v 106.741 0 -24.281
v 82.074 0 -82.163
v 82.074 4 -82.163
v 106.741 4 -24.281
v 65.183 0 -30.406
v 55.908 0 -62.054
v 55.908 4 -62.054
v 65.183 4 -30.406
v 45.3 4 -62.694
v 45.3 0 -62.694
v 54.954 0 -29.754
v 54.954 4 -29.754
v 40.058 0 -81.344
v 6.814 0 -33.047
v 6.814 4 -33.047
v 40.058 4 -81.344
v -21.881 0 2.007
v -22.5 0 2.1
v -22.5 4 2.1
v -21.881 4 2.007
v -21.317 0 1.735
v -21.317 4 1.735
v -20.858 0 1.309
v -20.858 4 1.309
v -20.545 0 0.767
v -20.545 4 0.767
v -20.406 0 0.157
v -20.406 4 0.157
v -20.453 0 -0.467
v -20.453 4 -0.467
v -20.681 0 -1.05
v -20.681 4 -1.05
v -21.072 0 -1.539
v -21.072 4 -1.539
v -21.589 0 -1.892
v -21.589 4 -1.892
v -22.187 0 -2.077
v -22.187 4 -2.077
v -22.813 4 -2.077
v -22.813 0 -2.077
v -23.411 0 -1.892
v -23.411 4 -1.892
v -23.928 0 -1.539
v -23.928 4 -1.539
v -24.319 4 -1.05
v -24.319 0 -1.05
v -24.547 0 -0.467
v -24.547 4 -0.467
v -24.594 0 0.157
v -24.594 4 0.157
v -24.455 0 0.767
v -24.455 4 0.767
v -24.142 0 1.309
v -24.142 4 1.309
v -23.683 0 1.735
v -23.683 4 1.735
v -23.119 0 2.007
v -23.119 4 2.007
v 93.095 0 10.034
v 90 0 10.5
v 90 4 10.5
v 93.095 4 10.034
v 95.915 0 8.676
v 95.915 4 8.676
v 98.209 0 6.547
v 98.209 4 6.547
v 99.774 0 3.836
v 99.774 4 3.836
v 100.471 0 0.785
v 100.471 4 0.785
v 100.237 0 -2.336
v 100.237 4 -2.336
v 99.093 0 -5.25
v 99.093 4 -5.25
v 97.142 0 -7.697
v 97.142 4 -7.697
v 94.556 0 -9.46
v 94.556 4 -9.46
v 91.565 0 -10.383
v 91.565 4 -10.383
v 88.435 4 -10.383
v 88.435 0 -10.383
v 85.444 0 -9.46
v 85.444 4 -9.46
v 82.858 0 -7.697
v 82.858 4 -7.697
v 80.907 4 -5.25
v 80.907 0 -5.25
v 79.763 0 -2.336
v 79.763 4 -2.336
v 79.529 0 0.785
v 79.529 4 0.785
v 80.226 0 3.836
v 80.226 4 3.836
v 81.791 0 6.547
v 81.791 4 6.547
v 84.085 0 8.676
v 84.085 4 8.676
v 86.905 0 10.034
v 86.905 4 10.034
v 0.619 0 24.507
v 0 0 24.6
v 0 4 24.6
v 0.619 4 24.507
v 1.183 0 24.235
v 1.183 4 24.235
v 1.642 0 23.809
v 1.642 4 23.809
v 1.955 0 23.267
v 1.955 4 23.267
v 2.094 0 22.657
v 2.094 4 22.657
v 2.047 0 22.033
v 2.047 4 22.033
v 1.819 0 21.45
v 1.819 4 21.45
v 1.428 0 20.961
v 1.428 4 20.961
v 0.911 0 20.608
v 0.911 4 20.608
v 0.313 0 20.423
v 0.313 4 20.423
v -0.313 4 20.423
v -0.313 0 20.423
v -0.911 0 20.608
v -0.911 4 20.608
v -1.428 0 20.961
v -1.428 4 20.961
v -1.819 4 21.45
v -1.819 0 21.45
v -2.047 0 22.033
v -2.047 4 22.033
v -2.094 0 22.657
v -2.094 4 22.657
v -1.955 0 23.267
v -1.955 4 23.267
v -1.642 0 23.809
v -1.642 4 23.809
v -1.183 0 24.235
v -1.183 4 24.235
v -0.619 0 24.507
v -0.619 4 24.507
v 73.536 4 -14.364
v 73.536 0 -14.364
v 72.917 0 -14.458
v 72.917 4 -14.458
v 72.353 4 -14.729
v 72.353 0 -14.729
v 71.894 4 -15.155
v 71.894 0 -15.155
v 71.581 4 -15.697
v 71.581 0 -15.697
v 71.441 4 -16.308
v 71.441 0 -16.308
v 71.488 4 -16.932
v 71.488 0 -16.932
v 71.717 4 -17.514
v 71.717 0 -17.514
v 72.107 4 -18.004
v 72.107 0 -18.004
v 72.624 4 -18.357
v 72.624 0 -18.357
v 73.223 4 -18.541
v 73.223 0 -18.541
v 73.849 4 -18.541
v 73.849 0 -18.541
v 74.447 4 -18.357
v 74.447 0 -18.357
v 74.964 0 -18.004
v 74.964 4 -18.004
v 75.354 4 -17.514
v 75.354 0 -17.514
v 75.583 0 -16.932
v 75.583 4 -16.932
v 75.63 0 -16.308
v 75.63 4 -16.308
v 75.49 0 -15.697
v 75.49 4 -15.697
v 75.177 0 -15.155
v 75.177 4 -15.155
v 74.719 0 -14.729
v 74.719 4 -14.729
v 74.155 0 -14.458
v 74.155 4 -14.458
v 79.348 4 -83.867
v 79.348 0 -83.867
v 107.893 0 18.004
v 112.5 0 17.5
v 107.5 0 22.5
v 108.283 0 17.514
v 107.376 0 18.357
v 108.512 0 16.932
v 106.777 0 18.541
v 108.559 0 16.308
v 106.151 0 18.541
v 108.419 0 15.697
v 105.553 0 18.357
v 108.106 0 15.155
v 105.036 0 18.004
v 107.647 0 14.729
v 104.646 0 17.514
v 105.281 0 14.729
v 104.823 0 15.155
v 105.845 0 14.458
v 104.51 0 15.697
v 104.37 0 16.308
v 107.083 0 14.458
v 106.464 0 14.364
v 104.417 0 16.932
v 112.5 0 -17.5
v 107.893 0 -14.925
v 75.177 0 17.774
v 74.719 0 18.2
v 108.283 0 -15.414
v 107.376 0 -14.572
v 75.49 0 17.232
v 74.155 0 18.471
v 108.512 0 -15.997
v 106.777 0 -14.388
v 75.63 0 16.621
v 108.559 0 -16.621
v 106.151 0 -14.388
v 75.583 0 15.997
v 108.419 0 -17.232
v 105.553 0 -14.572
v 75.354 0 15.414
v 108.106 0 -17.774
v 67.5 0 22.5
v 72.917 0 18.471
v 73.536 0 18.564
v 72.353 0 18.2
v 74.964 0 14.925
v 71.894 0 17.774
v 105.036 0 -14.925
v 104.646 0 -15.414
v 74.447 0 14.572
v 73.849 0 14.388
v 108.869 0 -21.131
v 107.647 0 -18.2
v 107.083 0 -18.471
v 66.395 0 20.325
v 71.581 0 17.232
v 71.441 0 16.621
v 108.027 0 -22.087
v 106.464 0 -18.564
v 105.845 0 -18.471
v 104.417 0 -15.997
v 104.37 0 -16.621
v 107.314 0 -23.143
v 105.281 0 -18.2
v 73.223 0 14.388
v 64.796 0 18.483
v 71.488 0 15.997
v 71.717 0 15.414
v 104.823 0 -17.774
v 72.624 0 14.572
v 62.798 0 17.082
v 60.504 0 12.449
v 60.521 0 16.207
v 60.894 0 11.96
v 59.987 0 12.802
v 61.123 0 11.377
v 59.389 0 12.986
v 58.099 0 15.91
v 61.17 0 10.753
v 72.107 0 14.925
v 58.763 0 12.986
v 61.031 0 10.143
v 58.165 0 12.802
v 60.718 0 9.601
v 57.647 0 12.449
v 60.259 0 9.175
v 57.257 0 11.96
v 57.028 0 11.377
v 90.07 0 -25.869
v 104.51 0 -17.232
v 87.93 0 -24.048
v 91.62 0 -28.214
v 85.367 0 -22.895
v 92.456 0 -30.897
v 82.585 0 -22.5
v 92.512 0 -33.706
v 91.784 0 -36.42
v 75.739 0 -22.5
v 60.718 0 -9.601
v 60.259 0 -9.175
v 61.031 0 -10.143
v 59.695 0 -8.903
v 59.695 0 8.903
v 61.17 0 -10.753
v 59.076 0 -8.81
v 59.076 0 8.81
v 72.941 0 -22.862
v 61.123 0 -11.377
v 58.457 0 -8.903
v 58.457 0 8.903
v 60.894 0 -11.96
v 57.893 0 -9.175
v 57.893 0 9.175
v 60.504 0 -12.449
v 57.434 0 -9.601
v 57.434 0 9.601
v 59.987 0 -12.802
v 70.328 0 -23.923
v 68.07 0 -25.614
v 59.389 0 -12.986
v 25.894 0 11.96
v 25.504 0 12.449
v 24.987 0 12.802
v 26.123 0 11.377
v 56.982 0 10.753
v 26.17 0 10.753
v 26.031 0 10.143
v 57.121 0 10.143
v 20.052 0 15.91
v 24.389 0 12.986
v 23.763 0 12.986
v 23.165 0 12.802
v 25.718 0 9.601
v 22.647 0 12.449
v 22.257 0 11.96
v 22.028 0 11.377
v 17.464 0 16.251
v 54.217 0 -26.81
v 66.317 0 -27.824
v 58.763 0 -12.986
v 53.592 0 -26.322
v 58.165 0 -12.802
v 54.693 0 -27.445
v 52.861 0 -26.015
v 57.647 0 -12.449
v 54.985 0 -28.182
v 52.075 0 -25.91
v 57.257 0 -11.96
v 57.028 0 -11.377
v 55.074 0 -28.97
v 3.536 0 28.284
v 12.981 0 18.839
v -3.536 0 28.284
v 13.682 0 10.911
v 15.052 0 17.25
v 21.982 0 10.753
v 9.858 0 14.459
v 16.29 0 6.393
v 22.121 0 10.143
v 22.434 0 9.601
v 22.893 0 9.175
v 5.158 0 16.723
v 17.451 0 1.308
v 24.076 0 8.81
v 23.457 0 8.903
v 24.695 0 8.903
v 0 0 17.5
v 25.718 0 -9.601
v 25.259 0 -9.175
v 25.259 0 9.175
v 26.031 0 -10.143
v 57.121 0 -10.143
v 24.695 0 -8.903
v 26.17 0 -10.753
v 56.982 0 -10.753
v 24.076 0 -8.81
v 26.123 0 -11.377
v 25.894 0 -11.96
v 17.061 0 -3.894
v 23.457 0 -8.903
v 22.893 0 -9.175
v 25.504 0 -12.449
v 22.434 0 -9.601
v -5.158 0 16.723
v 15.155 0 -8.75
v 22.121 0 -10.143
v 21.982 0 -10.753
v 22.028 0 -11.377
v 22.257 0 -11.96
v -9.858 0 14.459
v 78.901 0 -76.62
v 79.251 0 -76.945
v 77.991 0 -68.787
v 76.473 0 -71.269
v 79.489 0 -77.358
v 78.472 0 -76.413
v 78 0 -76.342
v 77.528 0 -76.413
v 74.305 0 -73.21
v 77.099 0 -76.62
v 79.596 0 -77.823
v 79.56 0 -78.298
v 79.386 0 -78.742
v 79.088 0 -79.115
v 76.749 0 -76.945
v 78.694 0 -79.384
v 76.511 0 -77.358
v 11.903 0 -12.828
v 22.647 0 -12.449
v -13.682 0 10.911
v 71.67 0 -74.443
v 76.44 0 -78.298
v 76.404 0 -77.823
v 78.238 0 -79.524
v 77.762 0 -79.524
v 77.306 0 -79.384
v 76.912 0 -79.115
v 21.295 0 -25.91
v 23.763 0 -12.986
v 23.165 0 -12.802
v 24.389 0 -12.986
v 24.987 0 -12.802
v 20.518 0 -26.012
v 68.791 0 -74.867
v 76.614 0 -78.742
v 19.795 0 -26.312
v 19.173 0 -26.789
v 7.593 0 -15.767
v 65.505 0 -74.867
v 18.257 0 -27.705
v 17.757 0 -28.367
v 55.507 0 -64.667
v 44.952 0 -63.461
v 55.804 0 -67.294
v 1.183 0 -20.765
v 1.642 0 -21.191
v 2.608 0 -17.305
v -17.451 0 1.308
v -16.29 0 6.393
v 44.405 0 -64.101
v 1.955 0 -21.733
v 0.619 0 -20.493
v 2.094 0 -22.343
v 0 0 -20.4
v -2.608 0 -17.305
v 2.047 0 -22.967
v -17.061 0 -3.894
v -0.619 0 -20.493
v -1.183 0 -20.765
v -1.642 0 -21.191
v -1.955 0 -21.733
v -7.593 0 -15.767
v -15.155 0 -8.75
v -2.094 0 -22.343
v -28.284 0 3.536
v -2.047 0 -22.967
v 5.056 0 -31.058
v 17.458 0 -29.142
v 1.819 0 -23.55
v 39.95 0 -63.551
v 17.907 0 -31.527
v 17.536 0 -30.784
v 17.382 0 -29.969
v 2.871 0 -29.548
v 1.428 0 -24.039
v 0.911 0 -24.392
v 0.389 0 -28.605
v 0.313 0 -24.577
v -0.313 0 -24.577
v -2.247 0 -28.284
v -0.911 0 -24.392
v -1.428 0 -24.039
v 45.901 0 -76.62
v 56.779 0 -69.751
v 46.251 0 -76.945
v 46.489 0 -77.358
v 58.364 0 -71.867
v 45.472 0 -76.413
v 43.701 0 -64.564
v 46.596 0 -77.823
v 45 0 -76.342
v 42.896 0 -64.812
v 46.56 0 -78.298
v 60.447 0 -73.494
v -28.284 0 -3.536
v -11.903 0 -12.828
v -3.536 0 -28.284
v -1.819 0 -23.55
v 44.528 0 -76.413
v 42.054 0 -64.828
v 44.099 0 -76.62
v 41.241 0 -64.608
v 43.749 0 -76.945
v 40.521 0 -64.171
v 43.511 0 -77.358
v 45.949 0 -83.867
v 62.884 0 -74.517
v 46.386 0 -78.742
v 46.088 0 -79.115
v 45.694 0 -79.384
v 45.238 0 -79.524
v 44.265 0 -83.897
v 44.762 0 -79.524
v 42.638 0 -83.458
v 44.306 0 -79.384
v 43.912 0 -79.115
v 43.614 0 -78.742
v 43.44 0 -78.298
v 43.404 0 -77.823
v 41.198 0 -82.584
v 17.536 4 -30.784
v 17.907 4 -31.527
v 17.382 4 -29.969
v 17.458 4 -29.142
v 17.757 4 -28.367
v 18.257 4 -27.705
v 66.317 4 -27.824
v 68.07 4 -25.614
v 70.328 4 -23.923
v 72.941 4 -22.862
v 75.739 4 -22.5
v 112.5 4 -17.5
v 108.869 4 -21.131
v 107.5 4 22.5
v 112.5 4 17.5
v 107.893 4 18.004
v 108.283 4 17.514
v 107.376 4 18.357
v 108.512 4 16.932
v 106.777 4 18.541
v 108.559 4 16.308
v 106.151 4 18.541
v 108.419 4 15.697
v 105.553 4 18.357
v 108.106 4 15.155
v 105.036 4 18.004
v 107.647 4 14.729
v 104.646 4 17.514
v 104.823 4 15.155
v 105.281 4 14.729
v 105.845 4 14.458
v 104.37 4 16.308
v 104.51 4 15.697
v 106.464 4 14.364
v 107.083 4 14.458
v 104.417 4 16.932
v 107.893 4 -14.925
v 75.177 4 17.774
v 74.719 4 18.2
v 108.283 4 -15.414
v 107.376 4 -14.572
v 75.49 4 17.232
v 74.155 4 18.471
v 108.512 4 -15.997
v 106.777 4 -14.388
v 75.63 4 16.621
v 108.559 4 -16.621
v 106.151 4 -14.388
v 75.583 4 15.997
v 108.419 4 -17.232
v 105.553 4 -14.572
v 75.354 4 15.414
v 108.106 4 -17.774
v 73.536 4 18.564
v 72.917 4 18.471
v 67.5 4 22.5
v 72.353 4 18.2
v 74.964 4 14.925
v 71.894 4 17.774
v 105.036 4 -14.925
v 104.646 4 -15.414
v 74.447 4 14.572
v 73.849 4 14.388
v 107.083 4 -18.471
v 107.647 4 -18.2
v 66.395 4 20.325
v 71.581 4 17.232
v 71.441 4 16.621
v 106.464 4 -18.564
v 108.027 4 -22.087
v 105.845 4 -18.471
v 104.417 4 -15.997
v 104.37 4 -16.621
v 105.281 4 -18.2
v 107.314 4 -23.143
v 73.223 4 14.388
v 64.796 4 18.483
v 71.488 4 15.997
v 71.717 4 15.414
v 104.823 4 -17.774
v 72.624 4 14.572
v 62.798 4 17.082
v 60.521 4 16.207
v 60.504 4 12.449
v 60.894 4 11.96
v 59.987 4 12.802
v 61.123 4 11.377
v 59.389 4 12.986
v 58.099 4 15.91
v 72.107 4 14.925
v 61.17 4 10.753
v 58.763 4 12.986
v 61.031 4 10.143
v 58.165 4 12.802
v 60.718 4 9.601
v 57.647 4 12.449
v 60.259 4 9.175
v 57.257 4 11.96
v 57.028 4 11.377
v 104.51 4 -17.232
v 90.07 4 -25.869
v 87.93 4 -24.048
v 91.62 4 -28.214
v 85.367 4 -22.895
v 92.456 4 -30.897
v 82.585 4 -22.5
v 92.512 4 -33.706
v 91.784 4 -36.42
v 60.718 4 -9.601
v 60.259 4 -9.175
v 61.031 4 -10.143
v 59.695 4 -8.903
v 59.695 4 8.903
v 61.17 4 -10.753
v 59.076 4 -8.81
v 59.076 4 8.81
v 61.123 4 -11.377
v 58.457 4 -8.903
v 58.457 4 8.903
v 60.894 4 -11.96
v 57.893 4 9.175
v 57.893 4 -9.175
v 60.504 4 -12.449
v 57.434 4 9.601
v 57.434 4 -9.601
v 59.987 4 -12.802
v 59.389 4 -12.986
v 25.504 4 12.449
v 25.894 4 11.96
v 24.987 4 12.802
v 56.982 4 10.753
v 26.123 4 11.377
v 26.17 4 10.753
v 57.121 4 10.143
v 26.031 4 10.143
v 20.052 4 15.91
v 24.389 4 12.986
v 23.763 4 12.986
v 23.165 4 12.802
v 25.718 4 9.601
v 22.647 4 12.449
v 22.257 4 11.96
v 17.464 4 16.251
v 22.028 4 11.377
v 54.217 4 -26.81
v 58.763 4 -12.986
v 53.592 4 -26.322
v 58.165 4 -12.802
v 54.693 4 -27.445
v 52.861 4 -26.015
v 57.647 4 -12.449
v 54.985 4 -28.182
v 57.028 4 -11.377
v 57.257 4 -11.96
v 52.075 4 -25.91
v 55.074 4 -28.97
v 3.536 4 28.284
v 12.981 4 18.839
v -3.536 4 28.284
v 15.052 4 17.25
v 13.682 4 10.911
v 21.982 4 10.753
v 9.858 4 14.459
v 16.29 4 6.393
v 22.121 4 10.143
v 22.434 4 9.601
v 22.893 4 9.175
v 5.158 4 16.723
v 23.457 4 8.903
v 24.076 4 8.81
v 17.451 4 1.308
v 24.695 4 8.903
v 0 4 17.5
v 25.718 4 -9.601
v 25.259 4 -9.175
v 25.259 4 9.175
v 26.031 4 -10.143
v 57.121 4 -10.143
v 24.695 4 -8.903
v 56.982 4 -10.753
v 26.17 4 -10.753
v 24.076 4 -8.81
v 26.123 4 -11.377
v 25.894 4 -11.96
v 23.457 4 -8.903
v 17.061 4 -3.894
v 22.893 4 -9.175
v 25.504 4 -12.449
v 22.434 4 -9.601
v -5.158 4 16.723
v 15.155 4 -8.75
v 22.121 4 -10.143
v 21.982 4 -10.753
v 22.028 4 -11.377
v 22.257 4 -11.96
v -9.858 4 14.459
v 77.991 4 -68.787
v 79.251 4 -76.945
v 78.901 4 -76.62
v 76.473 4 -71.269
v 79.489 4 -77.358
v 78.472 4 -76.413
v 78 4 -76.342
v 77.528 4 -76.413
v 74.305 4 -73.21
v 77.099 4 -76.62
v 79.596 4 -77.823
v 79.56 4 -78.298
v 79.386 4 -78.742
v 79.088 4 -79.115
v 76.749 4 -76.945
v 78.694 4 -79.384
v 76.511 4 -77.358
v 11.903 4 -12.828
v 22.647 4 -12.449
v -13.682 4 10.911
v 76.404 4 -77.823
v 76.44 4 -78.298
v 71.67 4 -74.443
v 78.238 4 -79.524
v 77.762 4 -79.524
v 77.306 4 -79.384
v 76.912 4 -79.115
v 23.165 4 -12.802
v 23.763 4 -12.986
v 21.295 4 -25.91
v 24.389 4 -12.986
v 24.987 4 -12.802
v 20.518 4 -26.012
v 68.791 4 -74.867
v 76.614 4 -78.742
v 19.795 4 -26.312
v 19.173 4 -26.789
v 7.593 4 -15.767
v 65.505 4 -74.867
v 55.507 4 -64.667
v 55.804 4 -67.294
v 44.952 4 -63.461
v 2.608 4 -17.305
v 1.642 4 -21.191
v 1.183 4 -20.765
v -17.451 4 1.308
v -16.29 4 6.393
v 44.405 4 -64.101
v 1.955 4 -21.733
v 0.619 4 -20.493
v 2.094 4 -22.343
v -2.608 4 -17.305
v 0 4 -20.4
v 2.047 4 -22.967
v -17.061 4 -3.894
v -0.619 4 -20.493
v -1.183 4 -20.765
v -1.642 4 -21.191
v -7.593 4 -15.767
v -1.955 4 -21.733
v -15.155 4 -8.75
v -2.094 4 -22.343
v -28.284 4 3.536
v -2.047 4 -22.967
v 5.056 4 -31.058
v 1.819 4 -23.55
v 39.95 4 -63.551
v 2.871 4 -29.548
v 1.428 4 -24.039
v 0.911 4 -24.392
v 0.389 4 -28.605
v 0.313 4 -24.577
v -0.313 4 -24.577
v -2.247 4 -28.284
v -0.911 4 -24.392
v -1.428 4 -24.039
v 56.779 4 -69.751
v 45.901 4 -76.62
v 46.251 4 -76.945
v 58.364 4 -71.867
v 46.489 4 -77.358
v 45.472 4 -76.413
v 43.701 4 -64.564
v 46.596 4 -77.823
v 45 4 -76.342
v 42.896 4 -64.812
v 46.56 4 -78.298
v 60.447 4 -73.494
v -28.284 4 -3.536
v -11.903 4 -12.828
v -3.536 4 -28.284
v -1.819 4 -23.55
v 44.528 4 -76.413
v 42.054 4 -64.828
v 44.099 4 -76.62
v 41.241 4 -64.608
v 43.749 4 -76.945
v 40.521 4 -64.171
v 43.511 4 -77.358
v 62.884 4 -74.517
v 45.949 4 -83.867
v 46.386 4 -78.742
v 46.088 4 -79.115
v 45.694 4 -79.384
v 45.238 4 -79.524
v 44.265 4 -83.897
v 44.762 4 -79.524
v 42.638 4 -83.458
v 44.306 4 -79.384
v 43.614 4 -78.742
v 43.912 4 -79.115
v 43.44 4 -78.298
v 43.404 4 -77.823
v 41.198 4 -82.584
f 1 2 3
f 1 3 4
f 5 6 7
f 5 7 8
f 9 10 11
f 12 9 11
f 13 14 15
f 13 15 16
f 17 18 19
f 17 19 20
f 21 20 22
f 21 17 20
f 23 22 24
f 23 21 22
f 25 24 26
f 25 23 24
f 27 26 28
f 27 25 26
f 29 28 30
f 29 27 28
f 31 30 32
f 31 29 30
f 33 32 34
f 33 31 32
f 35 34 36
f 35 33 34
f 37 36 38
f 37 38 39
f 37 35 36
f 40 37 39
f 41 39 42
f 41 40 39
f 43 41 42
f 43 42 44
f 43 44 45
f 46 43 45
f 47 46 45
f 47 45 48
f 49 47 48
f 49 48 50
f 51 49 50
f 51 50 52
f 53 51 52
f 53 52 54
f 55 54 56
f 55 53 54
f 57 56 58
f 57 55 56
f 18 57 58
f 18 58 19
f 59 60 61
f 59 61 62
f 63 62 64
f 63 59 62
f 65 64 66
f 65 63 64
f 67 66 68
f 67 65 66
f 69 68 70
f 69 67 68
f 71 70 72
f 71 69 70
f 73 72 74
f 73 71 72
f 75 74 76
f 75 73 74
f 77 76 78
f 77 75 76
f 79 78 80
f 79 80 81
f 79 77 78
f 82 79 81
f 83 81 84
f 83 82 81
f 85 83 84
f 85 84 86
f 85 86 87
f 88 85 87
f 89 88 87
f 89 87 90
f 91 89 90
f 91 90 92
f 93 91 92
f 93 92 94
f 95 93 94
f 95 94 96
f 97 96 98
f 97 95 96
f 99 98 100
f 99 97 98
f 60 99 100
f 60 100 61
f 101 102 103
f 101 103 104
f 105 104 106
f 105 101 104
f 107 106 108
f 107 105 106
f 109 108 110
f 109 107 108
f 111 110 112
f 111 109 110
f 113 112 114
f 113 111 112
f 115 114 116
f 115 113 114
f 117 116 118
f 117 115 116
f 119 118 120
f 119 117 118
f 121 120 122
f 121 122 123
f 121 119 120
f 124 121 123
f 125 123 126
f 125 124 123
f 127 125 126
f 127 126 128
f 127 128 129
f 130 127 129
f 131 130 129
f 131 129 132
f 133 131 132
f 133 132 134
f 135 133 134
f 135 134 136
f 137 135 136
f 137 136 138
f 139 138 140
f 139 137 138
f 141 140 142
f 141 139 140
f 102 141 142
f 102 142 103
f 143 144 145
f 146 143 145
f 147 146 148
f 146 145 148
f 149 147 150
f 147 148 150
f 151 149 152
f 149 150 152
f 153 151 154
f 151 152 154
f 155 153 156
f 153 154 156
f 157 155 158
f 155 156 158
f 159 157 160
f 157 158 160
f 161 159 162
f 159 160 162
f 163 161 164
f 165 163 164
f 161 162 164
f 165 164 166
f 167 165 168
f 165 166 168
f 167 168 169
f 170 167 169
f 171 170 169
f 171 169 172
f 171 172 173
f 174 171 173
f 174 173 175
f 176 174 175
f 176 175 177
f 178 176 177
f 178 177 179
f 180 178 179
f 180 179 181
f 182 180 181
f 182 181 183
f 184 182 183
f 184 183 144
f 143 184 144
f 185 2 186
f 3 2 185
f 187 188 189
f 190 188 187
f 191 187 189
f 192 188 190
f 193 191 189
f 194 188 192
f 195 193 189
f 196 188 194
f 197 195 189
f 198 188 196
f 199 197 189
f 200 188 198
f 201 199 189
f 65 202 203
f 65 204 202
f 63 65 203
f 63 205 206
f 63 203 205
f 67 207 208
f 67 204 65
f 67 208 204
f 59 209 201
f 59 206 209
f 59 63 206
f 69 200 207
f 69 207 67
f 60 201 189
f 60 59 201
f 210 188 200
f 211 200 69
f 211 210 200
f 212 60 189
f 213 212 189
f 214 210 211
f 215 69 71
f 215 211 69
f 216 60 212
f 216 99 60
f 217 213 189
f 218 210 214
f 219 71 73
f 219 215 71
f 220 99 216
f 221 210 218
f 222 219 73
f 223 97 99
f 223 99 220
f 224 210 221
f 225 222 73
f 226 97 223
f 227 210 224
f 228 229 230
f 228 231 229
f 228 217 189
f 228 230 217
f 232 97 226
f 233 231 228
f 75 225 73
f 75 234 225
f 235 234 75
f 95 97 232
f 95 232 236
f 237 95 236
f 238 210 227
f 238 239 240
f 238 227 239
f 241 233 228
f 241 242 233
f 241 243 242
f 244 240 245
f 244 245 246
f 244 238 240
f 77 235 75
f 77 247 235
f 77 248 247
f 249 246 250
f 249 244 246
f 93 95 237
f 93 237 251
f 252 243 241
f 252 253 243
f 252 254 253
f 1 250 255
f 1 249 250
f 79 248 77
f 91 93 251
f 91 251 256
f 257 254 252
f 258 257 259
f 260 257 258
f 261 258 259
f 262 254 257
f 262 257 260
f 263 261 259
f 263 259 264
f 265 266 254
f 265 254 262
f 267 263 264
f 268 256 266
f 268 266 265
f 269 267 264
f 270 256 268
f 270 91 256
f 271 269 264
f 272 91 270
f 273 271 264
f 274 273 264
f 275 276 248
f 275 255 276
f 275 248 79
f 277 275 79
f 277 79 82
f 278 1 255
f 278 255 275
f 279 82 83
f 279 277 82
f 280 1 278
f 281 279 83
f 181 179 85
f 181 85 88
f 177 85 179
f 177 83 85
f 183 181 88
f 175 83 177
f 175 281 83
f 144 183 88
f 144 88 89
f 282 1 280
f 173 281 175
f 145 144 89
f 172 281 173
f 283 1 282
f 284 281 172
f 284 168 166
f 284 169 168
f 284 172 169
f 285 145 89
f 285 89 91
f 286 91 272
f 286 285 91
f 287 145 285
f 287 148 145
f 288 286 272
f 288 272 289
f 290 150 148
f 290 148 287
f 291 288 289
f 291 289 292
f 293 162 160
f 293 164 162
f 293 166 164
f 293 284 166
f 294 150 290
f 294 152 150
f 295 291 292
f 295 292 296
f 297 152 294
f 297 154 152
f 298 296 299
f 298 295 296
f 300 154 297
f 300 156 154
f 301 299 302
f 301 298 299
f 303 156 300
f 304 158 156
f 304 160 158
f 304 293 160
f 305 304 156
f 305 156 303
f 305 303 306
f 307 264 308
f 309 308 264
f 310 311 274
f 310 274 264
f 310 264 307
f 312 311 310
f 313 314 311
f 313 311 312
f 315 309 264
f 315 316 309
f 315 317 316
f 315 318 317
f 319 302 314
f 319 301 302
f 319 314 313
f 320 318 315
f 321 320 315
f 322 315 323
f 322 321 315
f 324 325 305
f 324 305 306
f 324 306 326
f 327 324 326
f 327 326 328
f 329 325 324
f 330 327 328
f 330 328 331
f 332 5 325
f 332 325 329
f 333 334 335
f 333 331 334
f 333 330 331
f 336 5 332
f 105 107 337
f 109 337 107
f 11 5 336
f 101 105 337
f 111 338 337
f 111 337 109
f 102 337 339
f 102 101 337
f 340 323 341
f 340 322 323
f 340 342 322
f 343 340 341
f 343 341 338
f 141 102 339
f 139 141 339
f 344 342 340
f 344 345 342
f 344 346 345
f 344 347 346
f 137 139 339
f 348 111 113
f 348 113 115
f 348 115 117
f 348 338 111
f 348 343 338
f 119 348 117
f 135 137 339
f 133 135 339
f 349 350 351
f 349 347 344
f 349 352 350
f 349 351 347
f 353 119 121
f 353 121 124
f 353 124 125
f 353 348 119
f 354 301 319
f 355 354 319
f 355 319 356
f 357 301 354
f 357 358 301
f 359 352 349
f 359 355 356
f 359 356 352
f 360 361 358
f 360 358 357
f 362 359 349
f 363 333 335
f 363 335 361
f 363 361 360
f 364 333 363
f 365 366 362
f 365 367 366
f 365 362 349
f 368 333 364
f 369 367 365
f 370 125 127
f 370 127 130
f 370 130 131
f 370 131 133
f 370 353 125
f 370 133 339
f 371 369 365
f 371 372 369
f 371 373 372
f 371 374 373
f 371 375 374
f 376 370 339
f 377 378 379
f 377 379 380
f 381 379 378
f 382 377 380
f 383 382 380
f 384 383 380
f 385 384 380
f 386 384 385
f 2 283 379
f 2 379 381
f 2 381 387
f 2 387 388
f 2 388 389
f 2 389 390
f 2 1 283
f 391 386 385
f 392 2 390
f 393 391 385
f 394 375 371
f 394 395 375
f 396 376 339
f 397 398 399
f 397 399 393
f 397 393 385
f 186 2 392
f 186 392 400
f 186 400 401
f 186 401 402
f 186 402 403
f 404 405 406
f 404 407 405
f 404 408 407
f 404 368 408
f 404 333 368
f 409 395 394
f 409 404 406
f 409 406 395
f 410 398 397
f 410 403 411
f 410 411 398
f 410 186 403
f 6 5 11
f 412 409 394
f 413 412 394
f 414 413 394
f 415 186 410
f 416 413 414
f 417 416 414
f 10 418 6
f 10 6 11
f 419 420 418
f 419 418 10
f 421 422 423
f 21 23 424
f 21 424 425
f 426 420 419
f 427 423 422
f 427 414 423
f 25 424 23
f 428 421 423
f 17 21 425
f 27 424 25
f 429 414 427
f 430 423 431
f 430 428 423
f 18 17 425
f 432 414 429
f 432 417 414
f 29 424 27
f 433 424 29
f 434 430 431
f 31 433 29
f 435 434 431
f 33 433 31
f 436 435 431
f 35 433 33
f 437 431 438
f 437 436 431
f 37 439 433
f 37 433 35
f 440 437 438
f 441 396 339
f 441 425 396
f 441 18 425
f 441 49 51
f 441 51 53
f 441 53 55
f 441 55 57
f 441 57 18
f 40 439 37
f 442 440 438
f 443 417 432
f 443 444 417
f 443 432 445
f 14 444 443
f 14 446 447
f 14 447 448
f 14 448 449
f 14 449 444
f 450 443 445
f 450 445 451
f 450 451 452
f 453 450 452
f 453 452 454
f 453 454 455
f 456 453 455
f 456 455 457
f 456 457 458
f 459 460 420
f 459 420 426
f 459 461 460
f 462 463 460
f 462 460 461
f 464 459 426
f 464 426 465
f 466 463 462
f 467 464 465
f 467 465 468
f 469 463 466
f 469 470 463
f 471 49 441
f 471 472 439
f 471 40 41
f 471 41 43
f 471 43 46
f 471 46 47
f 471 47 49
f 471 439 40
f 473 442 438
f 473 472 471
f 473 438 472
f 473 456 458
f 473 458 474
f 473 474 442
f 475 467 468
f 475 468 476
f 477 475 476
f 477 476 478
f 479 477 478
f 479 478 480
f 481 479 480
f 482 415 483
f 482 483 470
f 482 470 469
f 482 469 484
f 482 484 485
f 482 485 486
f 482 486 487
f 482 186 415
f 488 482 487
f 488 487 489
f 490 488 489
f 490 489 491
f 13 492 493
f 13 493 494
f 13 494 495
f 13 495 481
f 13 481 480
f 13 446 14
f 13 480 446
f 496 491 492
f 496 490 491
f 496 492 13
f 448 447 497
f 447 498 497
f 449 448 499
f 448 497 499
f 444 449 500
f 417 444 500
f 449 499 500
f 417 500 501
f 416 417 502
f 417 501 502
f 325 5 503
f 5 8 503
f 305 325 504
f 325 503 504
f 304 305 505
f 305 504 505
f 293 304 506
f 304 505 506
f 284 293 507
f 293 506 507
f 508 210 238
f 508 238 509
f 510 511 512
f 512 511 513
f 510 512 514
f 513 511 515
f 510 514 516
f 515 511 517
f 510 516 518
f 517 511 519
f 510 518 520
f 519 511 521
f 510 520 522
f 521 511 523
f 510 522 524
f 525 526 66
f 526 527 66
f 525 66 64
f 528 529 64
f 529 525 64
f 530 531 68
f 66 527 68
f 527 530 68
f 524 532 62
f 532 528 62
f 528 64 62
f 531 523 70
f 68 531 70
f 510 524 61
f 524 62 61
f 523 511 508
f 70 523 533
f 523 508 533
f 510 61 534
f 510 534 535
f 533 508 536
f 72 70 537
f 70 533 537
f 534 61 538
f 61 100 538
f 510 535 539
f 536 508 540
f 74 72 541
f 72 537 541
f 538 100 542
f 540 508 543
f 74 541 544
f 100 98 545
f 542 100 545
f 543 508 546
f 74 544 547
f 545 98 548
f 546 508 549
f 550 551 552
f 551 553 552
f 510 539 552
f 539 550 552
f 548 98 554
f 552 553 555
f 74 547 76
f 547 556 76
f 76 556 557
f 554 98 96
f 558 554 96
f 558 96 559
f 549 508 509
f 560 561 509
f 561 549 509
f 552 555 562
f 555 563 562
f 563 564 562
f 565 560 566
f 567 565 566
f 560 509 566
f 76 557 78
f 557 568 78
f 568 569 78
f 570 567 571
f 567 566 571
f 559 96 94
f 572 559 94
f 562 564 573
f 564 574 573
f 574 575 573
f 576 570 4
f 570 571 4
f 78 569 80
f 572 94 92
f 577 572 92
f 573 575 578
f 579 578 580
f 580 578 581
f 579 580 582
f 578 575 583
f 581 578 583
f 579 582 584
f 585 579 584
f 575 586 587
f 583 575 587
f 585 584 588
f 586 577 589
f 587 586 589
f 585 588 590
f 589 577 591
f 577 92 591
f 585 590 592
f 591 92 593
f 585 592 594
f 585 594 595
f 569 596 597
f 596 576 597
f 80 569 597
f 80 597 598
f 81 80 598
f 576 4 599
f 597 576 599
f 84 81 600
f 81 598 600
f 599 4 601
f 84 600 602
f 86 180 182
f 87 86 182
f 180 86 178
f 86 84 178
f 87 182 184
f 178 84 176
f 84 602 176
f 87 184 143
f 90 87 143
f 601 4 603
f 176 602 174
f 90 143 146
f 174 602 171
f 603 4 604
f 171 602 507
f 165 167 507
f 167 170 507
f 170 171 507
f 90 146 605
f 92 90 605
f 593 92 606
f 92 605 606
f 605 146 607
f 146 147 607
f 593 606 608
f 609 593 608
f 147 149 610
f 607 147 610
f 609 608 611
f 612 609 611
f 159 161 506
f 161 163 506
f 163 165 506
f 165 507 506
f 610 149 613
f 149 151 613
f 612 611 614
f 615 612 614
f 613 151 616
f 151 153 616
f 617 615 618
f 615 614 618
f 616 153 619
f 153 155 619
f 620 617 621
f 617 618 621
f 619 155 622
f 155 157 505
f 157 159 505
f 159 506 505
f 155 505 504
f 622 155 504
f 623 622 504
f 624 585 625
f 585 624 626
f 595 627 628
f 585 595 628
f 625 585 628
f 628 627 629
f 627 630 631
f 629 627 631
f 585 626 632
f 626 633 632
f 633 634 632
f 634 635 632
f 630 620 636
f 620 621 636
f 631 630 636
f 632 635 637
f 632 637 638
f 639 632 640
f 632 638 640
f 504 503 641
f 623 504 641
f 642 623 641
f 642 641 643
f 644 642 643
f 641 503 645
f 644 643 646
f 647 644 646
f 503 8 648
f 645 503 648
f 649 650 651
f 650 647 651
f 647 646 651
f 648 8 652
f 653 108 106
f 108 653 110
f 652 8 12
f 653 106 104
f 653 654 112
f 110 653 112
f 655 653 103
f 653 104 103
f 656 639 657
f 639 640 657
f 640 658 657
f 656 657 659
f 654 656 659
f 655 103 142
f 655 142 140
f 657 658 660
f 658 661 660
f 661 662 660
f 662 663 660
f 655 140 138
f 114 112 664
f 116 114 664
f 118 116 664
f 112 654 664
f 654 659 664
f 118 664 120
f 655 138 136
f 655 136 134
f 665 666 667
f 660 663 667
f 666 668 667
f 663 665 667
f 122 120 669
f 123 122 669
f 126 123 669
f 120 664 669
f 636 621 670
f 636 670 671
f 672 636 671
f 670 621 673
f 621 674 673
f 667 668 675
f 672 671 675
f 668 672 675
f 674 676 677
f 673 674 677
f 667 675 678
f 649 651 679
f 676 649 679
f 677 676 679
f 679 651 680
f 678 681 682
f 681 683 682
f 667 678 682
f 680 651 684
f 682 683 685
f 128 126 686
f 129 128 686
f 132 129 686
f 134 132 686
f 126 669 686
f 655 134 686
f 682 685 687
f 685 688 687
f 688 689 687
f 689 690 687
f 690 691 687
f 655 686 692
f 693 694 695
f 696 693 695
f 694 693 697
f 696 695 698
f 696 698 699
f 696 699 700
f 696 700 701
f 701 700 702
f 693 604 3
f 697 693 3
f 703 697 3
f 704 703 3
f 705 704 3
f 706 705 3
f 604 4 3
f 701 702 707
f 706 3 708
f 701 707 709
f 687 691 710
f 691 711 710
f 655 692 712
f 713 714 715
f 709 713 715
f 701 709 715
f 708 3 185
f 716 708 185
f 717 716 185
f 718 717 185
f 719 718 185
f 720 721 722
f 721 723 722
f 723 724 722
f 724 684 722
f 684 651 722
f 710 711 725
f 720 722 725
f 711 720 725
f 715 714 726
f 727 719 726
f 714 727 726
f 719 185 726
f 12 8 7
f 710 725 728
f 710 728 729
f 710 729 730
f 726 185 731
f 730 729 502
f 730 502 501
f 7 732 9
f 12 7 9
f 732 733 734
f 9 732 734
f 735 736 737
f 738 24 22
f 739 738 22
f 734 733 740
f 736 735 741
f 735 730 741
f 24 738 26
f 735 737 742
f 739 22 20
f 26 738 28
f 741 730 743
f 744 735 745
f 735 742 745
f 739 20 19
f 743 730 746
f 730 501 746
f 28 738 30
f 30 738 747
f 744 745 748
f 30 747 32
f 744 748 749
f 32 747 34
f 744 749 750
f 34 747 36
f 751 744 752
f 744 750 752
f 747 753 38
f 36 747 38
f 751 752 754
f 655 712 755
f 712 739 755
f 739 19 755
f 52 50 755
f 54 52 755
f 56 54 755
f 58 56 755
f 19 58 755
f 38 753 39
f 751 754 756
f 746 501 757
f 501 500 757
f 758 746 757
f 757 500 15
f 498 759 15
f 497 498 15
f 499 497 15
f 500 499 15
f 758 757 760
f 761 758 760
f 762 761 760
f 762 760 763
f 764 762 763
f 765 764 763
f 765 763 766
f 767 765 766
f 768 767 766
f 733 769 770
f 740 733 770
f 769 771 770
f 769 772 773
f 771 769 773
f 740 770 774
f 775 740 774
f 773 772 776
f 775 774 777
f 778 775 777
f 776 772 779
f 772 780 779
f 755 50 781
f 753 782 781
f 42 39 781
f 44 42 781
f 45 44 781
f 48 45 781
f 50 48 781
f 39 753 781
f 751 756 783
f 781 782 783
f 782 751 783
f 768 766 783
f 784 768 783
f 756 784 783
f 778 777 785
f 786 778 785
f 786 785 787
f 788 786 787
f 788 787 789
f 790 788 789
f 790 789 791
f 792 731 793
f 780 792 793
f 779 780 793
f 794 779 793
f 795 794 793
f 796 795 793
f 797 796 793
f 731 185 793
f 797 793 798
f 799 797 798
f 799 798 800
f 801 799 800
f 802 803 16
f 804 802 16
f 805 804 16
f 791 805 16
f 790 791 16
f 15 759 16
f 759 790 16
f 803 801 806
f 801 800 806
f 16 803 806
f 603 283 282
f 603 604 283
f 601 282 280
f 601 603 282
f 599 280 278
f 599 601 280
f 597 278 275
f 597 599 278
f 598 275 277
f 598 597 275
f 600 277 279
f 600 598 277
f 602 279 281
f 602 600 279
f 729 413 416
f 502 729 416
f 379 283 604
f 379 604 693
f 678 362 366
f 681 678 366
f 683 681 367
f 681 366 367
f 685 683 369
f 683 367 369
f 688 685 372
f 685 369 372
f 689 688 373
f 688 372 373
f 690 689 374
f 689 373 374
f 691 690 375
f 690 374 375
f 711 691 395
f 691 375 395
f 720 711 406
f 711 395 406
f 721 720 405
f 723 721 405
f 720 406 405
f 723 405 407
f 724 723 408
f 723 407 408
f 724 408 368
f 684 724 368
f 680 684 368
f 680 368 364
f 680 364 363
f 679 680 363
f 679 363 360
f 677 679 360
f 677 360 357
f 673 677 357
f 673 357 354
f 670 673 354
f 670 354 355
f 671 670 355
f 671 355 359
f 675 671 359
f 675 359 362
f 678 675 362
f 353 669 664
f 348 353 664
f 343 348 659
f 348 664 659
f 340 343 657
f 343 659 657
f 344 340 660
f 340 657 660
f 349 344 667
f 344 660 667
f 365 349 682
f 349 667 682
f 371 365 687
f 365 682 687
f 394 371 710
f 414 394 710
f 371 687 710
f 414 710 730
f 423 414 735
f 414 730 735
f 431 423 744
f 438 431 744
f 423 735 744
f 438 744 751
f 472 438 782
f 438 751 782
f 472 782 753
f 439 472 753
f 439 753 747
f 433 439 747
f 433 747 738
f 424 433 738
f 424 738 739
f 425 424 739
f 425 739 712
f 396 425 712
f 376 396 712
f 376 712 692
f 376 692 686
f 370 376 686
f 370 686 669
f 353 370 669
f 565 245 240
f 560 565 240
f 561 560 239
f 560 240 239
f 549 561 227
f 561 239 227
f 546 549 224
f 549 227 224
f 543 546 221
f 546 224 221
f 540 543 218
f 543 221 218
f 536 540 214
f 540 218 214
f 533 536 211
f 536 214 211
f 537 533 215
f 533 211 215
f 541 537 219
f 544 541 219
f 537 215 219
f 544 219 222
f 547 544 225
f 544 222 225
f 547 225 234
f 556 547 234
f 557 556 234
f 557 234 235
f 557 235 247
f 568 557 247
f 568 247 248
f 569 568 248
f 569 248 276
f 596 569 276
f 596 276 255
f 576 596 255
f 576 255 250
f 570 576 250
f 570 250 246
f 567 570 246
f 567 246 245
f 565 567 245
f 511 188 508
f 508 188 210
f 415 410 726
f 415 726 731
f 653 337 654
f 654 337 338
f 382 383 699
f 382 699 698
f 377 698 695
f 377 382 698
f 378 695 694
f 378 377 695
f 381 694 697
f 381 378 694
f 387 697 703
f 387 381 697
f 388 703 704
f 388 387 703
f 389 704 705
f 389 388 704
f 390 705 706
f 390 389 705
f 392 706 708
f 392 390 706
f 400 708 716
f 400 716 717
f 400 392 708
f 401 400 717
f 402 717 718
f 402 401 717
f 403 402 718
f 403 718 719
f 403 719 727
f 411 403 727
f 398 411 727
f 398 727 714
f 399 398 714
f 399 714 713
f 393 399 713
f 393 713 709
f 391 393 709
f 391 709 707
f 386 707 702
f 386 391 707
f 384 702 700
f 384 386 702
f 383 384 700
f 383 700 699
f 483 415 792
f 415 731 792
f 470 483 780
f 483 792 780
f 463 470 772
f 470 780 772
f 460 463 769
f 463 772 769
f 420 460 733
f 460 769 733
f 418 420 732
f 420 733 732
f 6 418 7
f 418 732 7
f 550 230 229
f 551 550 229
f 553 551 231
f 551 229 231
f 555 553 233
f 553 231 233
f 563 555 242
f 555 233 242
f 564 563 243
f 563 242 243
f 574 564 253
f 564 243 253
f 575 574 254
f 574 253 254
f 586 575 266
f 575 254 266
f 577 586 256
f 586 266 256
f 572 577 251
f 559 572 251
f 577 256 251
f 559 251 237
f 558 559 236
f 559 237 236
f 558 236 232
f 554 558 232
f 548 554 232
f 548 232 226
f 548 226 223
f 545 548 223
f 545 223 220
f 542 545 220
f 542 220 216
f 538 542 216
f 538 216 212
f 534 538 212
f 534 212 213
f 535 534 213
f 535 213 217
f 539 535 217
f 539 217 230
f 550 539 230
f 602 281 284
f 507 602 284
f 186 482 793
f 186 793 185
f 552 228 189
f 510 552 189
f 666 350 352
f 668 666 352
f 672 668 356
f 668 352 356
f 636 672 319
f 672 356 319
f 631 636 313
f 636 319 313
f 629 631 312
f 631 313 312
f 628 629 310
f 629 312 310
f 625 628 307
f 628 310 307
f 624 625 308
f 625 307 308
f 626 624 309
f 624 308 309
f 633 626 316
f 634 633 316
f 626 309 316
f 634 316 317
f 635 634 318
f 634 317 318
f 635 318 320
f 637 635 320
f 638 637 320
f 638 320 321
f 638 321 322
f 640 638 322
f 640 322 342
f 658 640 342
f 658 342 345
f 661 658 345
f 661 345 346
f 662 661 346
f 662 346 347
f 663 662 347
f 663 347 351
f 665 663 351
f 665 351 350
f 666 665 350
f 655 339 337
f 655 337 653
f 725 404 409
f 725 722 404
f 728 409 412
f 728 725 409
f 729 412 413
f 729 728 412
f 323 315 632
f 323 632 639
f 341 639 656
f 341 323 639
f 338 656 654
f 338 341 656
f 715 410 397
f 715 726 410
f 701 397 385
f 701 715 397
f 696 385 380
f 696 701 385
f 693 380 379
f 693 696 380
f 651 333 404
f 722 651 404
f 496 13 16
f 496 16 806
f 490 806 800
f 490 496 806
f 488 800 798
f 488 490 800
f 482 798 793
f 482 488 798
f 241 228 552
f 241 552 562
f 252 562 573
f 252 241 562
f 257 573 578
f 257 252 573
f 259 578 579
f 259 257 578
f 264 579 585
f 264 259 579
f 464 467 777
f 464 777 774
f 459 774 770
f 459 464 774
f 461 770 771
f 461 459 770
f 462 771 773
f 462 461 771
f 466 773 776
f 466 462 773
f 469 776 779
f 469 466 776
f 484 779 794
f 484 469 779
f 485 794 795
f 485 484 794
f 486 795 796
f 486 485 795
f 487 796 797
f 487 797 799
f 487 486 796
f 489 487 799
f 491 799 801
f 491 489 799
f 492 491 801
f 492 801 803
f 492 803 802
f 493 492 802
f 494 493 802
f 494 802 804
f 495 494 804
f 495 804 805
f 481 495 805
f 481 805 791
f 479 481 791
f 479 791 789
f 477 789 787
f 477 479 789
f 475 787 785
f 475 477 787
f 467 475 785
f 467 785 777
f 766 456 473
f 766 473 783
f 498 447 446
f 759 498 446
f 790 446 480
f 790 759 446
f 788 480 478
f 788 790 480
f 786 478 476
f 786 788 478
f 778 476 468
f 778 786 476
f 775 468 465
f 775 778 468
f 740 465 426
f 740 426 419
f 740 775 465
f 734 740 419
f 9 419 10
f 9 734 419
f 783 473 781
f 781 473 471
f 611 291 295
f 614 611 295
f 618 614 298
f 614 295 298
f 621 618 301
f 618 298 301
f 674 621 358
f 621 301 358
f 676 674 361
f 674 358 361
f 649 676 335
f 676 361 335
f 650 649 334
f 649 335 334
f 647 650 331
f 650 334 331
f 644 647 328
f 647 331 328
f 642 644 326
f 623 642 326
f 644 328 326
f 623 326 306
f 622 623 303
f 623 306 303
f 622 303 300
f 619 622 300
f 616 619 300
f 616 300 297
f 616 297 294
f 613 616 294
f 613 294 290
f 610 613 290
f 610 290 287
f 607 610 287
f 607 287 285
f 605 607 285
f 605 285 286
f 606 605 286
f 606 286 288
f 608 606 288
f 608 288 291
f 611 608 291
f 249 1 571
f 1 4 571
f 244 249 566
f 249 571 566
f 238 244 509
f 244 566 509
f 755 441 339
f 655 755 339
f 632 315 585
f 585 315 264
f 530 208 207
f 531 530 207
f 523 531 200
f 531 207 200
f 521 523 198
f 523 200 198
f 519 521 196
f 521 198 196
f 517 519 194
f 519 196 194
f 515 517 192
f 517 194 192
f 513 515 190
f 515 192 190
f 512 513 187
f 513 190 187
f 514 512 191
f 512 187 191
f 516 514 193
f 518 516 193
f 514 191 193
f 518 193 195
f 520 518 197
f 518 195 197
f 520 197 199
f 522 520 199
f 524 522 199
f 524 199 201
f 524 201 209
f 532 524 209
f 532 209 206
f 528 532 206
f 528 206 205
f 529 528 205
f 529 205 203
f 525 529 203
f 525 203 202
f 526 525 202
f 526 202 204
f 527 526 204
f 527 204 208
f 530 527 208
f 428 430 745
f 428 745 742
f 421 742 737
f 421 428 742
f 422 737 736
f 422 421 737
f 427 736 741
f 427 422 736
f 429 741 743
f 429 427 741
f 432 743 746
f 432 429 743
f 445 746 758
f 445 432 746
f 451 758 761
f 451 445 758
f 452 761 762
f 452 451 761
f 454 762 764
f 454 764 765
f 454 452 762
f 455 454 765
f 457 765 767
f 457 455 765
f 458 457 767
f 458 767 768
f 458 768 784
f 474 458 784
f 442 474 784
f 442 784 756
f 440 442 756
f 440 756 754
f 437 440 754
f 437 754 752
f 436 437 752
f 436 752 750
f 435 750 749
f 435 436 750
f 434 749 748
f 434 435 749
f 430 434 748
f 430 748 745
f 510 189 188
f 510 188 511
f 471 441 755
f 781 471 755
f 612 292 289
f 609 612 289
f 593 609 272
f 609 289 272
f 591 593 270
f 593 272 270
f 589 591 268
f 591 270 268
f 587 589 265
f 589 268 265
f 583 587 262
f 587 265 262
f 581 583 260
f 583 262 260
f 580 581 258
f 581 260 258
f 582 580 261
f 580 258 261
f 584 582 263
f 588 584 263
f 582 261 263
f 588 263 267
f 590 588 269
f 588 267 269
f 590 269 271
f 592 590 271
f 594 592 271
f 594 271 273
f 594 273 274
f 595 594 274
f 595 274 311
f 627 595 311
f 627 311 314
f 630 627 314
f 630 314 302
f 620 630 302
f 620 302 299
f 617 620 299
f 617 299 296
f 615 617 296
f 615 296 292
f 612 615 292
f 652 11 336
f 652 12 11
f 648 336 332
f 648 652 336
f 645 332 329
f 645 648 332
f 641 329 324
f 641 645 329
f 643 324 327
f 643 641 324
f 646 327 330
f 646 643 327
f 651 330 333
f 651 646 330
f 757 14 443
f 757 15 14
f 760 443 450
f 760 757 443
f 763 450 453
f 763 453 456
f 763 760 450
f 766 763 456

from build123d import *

# Parameters (mm, degrees)
SKETCH_1_R          = 2.1
SKETCH_1_R_2        = 10.5
SKETCH_1_R_3        = 10
EXTRUDE_1_DEPTH     = 4
CHAMFER_1_SIZE      = 5
FILLET_1_R          = 10
SKETCH_2_R          = 2.1
CUT_EXTRUDE_1_DEPTH = 10
EXTRUDE_START       = -4
SKETCH_3_R          = 1.6
EXTRUDE_2_DEPTH     = 4
FILLET_2_R          = 3
FILLET_3_R          = 11
SKETCH_4_R          = 1.6
EXTRUDE_3_DEPTH     = 4
FILLET_4_R          = 10
CHAMFER_2_SIZE      = 2
CHAMFER_2_SIZE2     = 1.851556395
FILLET_5_R          = 10
SKETCH_5_R          = 17.5
CUT_EXTRUDE_2_DEPTH = 10


with BuildPart() as part:
    # 草图1 → 凸台-拉伸1 (new body)
    with BuildSketch(Plane(origin=(0, 0, 0), x_dir=(1, 0, 0), z_dir=(0, 1, 0))):
        Polygon((0, 31.819805153), (-31.819805153, 0), (0, -31.819805153), (15.909902577, -15.909902577), (67.5, -15.909902577), (67.5, -22.5), (112.5, -22.5), (112.5, 22.5), (67.5, 22.5), (67.5, 15.909902577), (15.909902577, 15.909902577), align=None)
        with Locations(Location((0, 14, 0), (0, 0, 270))):
            Circle(SKETCH_1_R, mode=Mode.SUBTRACT)
        with Locations(Location((14, 0, 0), (0, 0, 270))):
            Circle(SKETCH_1_R, mode=Mode.SUBTRACT)
        with Locations(Location((0, -14, 0), (0, 0, 270))):
            Circle(SKETCH_1_R, mode=Mode.SUBTRACT)
        with Locations(Location((-14, 0, 0), (0, 0, 270))):
            Circle(SKETCH_1_R, mode=Mode.SUBTRACT)
        with Locations(Location((90, 0, 0), (0, 0, 270))):
            Circle(SKETCH_1_R_2, mode=Mode.SUBTRACT)
        with Locations(Location((0, 22.5, 0), (0, 0, 270))):
            Circle(SKETCH_1_R, mode=Mode.SUBTRACT)
        with Locations(Location((0, -22.5, 0), (0, 0, 270))):
            Circle(SKETCH_1_R, mode=Mode.SUBTRACT)
        with Locations(Location((0, 0, 0), (0, 0, 270))):
            Circle(SKETCH_1_R_3, mode=Mode.SUBTRACT)
        with Locations(Location((-22.5, 0, 0), (0, 0, 270))):
            Circle(SKETCH_1_R, mode=Mode.SUBTRACT)
    extrude(amount=EXTRUDE_1_DEPTH)

    # 倒角1
    chamfer_1_edges = [part.edges().sort_by_distance(p)[0] for p in [
        (112.5, 2, -22.5),
        (112.5, 2, 22.5),
        (0, 2, 31.819805153),
        (-31.819805153, 2, 0),
        (0, 2, -31.819805153),
    ]]
    chamfer(chamfer_1_edges, length=CHAMFER_1_SIZE)

    # 圆角1
    # the kernel refuses this fillet: 10 mm, written as the material it adds along each edge
    with BuildSketch(Plane(origin=(15.909902577, 0, -15.909902577), x_dir=(-0.707106781186552, 0, -0.707106781186543), z_dir=(0, 1, 0))) as fillet_1_piece_1:
        with BuildLine():
            CenterArc((FILLET_1_R * 0.414213562373, -FILLET_1_R), FILLET_1_R, 90, 45)
            Line((-FILLET_1_R * 0.292893218813, -FILLET_1_R * 0.292893218813), (-FILLET_1_R * 0.307035354437, -FILLET_1_R * 0.27875108319))
            Line((-FILLET_1_R * 0.307035354437, -FILLET_1_R * 0.27875108319), (-FILLET_1_R * 0.00828427124746, FILLET_1_R * 0.02))
            Line((-FILLET_1_R * 0.00828427124746, FILLET_1_R * 0.02), (FILLET_1_R * 0.414213562373, FILLET_1_R * 0.02))
            Line((FILLET_1_R * 0.414213562373, FILLET_1_R * 0.02), (FILLET_1_R * 0.414213562373, 0))
        make_face()
    extrude(amount=4)
    with BuildSketch(Plane(origin=(15.909902577, 0, 15.909902577), x_dir=(-0.7071067811865422, 0, 0.707106781186553), z_dir=(0, 1, 0))) as fillet_1_piece_2:
        with BuildLine():
            CenterArc((FILLET_1_R * 0.414213562373, FILLET_1_R), FILLET_1_R, 225, 45)
            Line((-FILLET_1_R * 0.292893218813, FILLET_1_R * 0.292893218813), (-FILLET_1_R * 0.307035354437, FILLET_1_R * 0.27875108319))
            Line((-FILLET_1_R * 0.307035354437, FILLET_1_R * 0.27875108319), (-FILLET_1_R * 0.00828427124746, -FILLET_1_R * 0.02))
            Line((-FILLET_1_R * 0.00828427124746, -FILLET_1_R * 0.02), (FILLET_1_R * 0.414213562373, -FILLET_1_R * 0.02))
            Line((FILLET_1_R * 0.414213562373, -FILLET_1_R * 0.02), (FILLET_1_R * 0.414213562373, 0))
        make_face()
    extrude(amount=4)
    with BuildSketch(Plane(origin=(67.5, 0, 15.909902577), x_dir=(-1, 0, 0), z_dir=(0, 1, 0))) as fillet_1_piece_3:
        with BuildLine():
            CenterArc((9.400668296, 10), FILLET_1_R, 199.937217397, 70.062782603)
            Line((0, 6.590097423), (-0.188013366, 6.521899372))
            ThreePointArc((-0.188013366, 6.521899372), (-0.2, 3.295048712), (-0.2, 0))
            Line((-0.2, 0), (0, -0.2))
            Line((0, -0.2), (9.400668296, -0.2))
            Line((9.400668296, -0.2), (9.400668296, 0))
        make_face()
    extrude(amount=4)
    with BuildSketch(Plane(origin=(67.5, 0, -15.909902577), x_dir=(-1, 0, 0), z_dir=(0, 1, 0))) as fillet_1_piece_4:
        with BuildLine():
            CenterArc((9.400668296, -10), FILLET_1_R, 90, 70.062782603)
            Line((0, -6.590097423), (-0.188013366, -6.521899372))
            ThreePointArc((-0.188013366, -6.521899372), (-0.2, -3.295048712), (-0.2, 0))
            Line((-0.2, 0), (0, 0.2))
            Line((0, 0.2), (9.400668296, 0.2))
            Line((9.400668296, 0.2), (9.400668296, 0))
        make_face()
    extrude(amount=4)

    # 草图2 → 切除-拉伸1 (cut)
    with BuildSketch(Plane.XZ):
        with Locations(Location((106.464466094, 16.464466094, 0), (0, 0, 270))):
            Circle(SKETCH_2_R)
        with Locations(Location((106.464466094, -16.464466094, 0), (0, 0, 270))):
            Circle(SKETCH_2_R)
        with Locations(Location((73.535533906, -16.464466094, 0), (0, 0, 90))):
            Circle(SKETCH_2_R)
        with Locations(Location((73.535533906, 16.464466094, 0), (0, 0, 90))):
            Circle(SKETCH_2_R)
        with Locations(Location((24.075684952, 10.909902577, 0), (0, 0, 270))):
            Circle(SKETCH_2_R)
        with Locations(Location((59.075684952, 10.909902577, 0), (0, 0, 270))):
            Circle(SKETCH_2_R)
        with Locations(Location((59.075684952, -10.909902577, 0), (0, 0, 90))):
            Circle(SKETCH_2_R)
        with Locations(Location((24.075684952, -10.909902577, 0), (0, 0, 90))):
            Circle(SKETCH_2_R)
    extrude(amount=-CUT_EXTRUDE_1_DEPTH, mode=Mode.SUBTRACT)

    # 草图3 → 凸台-拉伸2 (add)
    with BuildSketch(Plane(origin=(0, 4, 0), x_dir=(1, 0, 0), z_dir=(0, 1, 0)).offset(EXTRUDE_START)):
        with BuildLine():
            Line((3.535533906, 28.284271247), (40.057636417, 81.344203773))
            ThreePointArc((40.057636417, 81.344203773), (45.94930127, 83.86671265), (50.75784592, 79.629654221))
            Line((50.75784592, 79.629654221), (67.5, 22.5))
            ThreePointArc((67.5, 22.5), (63.839583189, 17.721525883), (58.099331704, 15.909902577))
            Line((58.099331704, 15.909902577), (20.0520382, 15.909902577))
            ThreePointArc((20.0520382, 15.909902577), (16.225203877, 16.671107252), (12.980970389, 18.838834765))
            Line((12.980970389, 18.838834765), (3.535533906, 28.284271247))
        make_face()
        with Locations(Location((45, 77.942286341, 0), (0, 0, 270))):
            Circle(SKETCH_3_R, mode=Mode.SUBTRACT)
        Polygon((16.491758356, 29.470182421), (43.526560522, 68.746803428), (56.080145943, 25.909902577), (20.0520382, 25.909902577), align=None, mode=Mode.SUBTRACT)
    extrude(amount=EXTRUDE_2_DEPTH)

    # 圆角2
    fillet_2_edges = [part.edges().sort_by_distance(p)[0] for p in [
        (16.491758356, 2, -29.470182421),
        (43.526560522, 2, -68.746803428),
        (56.080145943, 2, -25.909902577),
        (20.0520382, 2, -25.909902577),
    ]]
    fillet(fillet_2_edges, radius=FILLET_2_R)

    # 圆角3
    fillet_3_edges = [part.edges().sort_by_distance(p)[0] for p in [
        (67.5, 2, -22.5),
        (3.535533906, 2, -28.284271247),
    ]]
    fillet(fillet_3_edges, radius=FILLET_3_R)

    # 草图4 → 凸台-拉伸3 (add)
    with BuildSketch(Plane(origin=(0, 4, 0), x_dir=(1, 0, 0), z_dir=(0, 1, 0)).offset(EXTRUDE_START)):
        with BuildLine():
            Line((45.94930127, 83.86671265), (81.347717681, 83.86671265))
            Line((81.347717681, 83.86671265), (107.5, 22.5))
            Line((107.5, 22.5), (97.716806526, 22.5))
            Line((97.716806526, 22.5), (75.4, 74.86671265))
            Line((75.4, 74.86671265), (52.153651701, 74.86671265))
            Line((52.153651701, 74.86671265), (50.75784592, 79.629654221))
            ThreePointArc((50.75784592, 79.629654221), (48.966689034, 82.443994695), (45.94930127, 83.86671265))
        make_face()
        with Locations(Location((78, 77.942286341, 0), (0, 0, 270))):
            Circle(SKETCH_4_R, mode=Mode.SUBTRACT)
    extrude(amount=EXTRUDE_3_DEPTH)

    # 圆角4
    fillet_4_edges = [part.edges().sort_by_distance(p)[0] for p in [
        (97.716806526, 2, -22.5),
        (75.4, 2, -74.86671265),
        (52.153651701, 2, -74.86671265),
    ]]
    fillet(fillet_4_edges, radius=FILLET_4_R)

    # 倒角2
    chamfer_2_edges = [part.edges().sort_by_distance(p)[0] for p in [
        (81.347717681, 2, -83.86671265),
    ]]
    chamfer_2_side = [part.faces().sort_by_distance(p)[0] for p in [
        (63.648509476, 2, -83.86671265),
    ]]
    chamfer(chamfer_2_edges, length=CHAMFER_2_SIZE, length2=CHAMFER_2_SIZE2, reference=chamfer_2_side[0])

    # 圆角5
    fillet_5_edges = [part.edges().sort_by_distance(p)[0] for p in [
        (107.5, 2, -22.5),
    ]]
    fillet(fillet_5_edges, radius=FILLET_5_R)

    # 草图5 → 切除-拉伸2 (cut)
    with BuildSketch(Plane(origin=(0, 4, 0), x_dir=(1, 0, 0), z_dir=(0, 1, 0))):
        with Locations(Location((0, 0, 0), (0, 0, 270))):
            Circle(SKETCH_5_R)
    extrude(amount=-CUT_EXTRUDE_2_DEPTH, mode=Mode.SUBTRACT)


solid = part.part
